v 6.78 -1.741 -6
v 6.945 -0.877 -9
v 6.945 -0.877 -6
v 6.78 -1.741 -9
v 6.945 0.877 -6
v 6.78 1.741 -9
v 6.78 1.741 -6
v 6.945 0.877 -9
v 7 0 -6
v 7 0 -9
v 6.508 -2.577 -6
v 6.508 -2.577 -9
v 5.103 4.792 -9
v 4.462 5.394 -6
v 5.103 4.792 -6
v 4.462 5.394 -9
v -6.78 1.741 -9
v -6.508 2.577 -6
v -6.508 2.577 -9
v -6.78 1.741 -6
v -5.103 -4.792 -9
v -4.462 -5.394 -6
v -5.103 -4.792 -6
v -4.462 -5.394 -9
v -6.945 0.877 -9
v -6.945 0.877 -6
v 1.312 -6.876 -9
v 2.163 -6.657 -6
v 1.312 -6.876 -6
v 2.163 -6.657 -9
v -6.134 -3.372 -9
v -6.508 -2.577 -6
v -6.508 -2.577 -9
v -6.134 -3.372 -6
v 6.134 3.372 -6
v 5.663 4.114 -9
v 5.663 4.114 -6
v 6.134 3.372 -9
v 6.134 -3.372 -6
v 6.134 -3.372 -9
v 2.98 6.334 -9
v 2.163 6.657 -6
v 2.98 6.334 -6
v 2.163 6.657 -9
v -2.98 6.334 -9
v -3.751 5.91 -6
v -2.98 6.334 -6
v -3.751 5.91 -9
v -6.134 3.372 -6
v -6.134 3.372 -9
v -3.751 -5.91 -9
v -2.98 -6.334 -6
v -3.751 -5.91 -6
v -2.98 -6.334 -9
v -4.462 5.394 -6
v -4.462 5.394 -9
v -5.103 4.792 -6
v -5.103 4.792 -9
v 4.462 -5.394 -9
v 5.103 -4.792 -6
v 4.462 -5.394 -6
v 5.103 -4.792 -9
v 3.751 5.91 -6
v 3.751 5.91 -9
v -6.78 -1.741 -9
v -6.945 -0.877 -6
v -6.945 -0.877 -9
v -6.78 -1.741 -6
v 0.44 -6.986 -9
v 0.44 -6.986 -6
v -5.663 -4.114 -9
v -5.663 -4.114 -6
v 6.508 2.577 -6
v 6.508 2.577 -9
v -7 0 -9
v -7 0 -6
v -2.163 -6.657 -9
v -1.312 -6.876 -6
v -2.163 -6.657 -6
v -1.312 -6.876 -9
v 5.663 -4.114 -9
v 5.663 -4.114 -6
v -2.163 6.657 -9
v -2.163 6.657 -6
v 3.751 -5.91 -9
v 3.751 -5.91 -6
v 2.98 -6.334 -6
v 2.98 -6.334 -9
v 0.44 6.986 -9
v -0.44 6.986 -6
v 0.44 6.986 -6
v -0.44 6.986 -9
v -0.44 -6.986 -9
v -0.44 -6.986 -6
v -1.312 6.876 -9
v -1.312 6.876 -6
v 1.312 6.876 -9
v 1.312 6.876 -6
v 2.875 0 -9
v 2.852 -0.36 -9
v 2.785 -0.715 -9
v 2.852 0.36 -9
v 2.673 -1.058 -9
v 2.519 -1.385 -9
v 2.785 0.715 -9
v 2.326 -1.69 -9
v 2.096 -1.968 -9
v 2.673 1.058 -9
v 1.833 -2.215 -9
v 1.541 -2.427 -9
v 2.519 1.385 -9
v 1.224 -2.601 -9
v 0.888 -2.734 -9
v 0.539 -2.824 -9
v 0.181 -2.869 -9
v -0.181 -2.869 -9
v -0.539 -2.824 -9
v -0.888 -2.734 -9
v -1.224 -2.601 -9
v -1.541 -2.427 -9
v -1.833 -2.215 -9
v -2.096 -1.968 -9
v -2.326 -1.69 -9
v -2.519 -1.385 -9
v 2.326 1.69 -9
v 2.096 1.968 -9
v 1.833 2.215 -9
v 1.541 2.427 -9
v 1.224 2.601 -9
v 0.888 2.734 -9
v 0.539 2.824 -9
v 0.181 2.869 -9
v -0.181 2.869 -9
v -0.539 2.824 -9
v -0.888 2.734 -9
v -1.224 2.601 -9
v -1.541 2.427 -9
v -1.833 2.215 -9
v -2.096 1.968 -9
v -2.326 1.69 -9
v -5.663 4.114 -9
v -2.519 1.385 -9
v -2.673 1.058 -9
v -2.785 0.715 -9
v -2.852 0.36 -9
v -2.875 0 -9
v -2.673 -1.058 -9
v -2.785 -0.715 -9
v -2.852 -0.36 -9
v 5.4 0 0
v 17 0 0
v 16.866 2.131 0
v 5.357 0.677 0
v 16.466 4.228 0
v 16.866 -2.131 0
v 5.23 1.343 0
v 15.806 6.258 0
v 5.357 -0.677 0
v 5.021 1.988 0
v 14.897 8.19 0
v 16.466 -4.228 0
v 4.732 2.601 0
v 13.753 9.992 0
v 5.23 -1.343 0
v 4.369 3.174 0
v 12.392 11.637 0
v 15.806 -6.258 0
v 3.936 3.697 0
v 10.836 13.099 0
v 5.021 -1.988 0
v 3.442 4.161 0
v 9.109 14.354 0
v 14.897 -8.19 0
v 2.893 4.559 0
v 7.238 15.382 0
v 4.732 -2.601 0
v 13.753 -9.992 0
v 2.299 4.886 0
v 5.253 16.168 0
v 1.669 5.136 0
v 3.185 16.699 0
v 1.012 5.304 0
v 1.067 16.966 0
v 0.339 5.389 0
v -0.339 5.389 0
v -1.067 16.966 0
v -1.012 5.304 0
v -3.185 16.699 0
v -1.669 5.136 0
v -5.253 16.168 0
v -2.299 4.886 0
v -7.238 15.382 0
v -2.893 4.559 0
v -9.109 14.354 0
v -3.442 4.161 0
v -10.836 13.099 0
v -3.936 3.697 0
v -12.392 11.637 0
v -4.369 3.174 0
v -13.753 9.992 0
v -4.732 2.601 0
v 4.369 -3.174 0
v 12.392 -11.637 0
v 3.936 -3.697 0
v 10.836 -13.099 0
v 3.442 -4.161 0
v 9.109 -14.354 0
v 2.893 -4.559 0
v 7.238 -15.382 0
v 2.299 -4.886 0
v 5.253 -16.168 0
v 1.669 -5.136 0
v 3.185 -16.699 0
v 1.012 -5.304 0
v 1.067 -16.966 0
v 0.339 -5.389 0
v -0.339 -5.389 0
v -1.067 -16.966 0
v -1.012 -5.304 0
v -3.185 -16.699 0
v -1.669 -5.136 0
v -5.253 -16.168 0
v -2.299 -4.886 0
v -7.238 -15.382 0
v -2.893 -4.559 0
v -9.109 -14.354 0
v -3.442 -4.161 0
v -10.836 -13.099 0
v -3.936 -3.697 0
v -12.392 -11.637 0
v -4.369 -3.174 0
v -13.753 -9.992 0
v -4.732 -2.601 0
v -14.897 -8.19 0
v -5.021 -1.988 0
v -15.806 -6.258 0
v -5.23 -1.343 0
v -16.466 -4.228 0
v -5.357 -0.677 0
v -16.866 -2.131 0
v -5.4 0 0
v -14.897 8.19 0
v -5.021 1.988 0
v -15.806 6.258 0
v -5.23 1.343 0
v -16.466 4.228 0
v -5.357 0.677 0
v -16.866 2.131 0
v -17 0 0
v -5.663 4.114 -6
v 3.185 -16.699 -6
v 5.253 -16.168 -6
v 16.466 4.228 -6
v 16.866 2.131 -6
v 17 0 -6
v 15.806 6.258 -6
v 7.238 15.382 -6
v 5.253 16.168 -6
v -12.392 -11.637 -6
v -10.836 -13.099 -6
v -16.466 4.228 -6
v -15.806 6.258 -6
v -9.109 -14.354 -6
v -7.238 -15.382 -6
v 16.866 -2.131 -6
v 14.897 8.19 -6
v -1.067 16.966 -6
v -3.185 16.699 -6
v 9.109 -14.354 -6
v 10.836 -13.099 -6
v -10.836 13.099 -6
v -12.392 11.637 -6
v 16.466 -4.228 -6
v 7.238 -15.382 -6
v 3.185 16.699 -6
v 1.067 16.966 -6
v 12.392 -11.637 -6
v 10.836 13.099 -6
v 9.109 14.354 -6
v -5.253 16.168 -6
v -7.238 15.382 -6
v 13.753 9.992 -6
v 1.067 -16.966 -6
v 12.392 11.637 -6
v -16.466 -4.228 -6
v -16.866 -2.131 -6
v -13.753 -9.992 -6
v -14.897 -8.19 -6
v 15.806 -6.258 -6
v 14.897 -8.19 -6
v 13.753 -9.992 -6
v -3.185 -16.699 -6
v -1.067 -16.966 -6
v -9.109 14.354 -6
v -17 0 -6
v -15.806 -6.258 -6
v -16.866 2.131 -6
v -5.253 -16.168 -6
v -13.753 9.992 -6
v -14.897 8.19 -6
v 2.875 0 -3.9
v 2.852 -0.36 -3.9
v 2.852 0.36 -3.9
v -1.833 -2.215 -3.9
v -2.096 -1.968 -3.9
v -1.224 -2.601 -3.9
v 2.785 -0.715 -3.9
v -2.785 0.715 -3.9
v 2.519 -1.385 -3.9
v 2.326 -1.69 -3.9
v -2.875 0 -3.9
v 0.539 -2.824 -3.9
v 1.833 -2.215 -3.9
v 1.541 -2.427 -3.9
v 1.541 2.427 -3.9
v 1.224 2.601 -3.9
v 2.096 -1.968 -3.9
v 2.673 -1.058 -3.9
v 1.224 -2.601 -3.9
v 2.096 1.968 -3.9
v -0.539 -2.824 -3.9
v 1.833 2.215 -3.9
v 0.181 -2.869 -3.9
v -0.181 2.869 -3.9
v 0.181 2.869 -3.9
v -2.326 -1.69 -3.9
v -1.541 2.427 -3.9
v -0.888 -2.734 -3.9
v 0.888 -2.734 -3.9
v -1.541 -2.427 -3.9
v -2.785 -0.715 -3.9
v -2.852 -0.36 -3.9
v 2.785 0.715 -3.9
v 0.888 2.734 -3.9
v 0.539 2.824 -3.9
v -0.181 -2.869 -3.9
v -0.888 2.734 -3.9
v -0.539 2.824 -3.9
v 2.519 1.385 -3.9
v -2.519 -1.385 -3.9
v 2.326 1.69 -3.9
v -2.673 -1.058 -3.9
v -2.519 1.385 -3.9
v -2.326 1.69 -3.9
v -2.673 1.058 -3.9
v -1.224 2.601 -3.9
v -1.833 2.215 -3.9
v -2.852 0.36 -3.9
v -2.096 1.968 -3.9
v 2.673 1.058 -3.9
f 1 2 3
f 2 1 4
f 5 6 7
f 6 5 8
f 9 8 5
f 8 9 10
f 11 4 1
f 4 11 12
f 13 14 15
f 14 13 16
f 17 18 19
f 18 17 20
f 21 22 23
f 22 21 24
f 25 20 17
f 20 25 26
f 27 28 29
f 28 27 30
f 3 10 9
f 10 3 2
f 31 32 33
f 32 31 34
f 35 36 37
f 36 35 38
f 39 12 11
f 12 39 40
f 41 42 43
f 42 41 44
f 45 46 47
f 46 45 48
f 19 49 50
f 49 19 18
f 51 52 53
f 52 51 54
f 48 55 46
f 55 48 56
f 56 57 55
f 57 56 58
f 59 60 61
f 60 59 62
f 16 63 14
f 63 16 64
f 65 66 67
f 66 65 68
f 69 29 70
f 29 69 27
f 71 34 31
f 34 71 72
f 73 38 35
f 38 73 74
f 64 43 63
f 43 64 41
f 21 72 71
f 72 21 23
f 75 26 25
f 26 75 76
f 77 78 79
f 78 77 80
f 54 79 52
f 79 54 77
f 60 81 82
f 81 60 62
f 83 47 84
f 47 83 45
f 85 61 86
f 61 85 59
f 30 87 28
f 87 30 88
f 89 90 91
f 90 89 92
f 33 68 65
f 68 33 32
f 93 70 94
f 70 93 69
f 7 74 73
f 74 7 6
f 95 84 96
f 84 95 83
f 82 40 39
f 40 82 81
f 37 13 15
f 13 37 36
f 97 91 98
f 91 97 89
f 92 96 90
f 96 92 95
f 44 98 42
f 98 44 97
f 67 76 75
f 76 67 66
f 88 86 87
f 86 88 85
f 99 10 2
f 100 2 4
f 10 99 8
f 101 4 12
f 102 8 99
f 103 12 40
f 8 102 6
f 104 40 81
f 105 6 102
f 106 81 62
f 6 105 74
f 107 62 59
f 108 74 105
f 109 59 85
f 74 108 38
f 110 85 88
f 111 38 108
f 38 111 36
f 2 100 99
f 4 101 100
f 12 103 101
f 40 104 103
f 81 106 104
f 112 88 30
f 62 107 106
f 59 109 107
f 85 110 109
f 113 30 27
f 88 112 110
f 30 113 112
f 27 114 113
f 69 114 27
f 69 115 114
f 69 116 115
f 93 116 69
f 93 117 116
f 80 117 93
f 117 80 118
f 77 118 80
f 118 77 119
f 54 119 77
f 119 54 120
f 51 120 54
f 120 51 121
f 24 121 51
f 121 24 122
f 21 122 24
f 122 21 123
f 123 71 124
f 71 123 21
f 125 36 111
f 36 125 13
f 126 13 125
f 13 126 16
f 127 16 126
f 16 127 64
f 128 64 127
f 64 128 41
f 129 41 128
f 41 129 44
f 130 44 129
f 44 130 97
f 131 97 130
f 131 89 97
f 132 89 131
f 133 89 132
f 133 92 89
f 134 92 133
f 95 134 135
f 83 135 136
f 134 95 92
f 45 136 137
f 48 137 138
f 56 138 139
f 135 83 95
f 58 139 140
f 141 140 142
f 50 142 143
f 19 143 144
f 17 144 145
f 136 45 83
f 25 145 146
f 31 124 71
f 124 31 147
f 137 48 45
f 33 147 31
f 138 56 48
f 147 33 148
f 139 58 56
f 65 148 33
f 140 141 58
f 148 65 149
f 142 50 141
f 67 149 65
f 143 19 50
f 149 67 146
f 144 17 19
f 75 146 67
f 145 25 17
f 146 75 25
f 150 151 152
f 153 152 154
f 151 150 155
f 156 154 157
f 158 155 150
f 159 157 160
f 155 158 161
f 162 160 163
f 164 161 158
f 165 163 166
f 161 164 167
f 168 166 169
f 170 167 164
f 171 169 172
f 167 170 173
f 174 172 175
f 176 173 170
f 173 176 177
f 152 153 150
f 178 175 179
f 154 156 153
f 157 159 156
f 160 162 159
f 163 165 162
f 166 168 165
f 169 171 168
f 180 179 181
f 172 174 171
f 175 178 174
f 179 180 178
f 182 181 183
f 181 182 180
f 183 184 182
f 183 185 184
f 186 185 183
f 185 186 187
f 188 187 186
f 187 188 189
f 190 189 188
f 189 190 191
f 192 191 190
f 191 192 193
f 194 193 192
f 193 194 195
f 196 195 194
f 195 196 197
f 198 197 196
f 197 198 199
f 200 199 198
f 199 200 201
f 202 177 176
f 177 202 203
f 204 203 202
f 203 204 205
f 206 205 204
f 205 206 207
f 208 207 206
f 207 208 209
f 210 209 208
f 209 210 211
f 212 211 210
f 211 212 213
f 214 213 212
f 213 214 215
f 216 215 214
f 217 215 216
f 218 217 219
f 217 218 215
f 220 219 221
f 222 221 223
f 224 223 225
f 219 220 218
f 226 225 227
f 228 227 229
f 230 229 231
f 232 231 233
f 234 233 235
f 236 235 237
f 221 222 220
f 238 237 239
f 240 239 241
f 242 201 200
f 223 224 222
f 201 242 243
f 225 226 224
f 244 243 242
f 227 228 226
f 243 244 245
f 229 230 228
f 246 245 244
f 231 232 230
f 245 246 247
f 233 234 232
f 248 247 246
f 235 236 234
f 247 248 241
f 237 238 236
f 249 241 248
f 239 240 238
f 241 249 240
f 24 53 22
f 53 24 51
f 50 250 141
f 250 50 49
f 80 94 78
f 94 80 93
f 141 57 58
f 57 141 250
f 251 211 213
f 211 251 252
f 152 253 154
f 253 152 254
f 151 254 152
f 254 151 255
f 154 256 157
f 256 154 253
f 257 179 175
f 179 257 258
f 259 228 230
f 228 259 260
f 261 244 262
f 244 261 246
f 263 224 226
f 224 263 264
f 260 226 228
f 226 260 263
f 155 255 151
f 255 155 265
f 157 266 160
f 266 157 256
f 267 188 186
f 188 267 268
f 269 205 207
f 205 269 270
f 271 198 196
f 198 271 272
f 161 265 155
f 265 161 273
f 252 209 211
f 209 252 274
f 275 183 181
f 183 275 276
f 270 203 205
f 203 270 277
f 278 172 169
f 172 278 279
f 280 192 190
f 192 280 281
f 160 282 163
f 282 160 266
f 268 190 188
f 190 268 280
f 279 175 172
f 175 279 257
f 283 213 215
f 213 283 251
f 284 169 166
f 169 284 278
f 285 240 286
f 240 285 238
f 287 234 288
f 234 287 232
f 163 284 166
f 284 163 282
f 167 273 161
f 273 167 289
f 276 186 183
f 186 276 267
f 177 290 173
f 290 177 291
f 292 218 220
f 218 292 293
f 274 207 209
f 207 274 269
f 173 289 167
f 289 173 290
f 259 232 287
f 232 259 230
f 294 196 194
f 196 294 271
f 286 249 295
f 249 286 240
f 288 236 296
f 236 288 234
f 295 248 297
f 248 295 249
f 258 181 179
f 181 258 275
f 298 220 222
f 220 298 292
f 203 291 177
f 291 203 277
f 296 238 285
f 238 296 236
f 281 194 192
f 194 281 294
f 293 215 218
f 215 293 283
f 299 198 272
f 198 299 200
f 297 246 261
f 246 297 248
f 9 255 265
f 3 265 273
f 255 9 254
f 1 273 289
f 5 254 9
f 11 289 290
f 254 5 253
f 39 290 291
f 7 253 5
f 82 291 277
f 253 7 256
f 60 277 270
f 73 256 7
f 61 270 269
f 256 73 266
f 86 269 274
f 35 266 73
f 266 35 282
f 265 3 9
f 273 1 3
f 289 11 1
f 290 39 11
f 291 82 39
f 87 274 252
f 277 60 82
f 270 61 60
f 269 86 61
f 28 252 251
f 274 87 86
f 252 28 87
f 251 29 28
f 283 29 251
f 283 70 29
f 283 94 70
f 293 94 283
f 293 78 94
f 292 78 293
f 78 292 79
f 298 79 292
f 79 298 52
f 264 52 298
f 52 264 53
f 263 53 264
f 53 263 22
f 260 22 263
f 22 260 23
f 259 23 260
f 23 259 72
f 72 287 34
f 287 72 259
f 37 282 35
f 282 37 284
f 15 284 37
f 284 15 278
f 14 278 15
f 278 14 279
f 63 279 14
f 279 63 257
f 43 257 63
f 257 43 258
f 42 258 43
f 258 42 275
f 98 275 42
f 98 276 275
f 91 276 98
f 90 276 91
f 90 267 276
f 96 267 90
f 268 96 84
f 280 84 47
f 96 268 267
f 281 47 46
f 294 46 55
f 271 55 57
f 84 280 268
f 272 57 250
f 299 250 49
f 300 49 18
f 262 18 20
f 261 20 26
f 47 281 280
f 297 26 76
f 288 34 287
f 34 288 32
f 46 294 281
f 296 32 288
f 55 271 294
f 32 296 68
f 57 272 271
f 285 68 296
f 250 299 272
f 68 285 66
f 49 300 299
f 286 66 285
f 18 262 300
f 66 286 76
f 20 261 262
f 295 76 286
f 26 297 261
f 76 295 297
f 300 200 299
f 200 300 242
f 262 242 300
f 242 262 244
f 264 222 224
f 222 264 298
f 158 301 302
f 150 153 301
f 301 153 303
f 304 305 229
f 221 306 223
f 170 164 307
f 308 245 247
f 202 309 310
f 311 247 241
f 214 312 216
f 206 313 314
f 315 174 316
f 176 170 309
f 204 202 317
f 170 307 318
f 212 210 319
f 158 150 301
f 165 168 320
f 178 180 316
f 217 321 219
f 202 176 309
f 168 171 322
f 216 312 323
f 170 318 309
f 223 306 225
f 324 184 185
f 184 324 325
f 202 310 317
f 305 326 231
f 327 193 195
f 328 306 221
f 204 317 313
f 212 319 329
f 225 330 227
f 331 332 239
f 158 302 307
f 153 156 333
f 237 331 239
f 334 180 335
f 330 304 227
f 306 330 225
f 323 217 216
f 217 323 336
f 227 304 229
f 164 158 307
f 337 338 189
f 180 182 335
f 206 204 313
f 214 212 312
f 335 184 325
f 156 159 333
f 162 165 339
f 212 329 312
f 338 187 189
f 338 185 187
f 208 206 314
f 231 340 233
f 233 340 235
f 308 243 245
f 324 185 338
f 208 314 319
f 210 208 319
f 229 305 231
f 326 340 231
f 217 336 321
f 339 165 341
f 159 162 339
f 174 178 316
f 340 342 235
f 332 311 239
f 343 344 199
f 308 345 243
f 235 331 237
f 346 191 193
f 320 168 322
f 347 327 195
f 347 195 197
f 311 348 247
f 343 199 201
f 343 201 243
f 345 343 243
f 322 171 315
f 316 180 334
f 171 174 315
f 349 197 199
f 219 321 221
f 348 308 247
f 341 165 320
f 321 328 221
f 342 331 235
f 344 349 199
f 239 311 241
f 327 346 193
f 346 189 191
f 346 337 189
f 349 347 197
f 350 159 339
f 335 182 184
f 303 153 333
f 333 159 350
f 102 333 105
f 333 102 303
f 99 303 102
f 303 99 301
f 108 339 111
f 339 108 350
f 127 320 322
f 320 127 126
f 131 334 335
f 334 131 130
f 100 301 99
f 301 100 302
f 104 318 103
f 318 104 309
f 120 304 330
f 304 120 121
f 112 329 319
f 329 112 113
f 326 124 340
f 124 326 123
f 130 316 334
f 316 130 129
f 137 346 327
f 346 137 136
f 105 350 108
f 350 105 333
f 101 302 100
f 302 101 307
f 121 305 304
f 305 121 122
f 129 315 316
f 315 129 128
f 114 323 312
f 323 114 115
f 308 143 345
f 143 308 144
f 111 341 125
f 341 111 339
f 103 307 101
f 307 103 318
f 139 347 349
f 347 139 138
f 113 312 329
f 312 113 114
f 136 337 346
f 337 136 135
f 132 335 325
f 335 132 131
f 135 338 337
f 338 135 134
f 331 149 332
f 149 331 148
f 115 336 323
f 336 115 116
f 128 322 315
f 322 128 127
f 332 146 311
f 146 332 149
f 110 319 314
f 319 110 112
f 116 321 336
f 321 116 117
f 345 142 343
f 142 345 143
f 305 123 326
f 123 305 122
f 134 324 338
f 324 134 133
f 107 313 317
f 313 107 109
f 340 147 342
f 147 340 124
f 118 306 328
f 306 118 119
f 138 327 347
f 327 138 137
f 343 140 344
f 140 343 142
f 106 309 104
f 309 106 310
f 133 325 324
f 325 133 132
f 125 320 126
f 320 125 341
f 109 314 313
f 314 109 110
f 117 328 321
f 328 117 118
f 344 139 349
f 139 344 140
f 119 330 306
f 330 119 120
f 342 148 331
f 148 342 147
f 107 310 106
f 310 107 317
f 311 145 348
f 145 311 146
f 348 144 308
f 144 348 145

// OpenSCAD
$fn = 50;


difference() {
	union() {
		translate(v = [0, 0, -9.0000000000]) {
			cylinder(h = 9, r = 7.0000000000);
		}
		translate(v = [0, 0, -6.0000000000]) {
			cylinder(h = 6, r = 17.0000000000);
		}
	}
	union() {
		translate(v = [0, 0, 0]) {
			rotate(a = [0, 0, 0]) {
				difference() {
					union() {
						#translate(v = [0, 0, -9.0000000000]) {
							cylinder(h = 9, r = 2.6000000000);
						}
						#translate(v = [0, 0, -3.9000000000]) {
							cylinder(h = 3.9000000000, r = 7.0000000000, r1 = 2.8750000000, r2 = 5.4000000000);
						}
						#translate(v = [0, 0, -9.0000000000]) {
							cylinder(h = 9, r = 2.8750000000);
						}
						#translate(v = [0, 0, -9.0000000000]) {
							cylinder(h = 9, r = 2.6000000000);
						}
					}
					union();
				}
			}
		}
	}
}
